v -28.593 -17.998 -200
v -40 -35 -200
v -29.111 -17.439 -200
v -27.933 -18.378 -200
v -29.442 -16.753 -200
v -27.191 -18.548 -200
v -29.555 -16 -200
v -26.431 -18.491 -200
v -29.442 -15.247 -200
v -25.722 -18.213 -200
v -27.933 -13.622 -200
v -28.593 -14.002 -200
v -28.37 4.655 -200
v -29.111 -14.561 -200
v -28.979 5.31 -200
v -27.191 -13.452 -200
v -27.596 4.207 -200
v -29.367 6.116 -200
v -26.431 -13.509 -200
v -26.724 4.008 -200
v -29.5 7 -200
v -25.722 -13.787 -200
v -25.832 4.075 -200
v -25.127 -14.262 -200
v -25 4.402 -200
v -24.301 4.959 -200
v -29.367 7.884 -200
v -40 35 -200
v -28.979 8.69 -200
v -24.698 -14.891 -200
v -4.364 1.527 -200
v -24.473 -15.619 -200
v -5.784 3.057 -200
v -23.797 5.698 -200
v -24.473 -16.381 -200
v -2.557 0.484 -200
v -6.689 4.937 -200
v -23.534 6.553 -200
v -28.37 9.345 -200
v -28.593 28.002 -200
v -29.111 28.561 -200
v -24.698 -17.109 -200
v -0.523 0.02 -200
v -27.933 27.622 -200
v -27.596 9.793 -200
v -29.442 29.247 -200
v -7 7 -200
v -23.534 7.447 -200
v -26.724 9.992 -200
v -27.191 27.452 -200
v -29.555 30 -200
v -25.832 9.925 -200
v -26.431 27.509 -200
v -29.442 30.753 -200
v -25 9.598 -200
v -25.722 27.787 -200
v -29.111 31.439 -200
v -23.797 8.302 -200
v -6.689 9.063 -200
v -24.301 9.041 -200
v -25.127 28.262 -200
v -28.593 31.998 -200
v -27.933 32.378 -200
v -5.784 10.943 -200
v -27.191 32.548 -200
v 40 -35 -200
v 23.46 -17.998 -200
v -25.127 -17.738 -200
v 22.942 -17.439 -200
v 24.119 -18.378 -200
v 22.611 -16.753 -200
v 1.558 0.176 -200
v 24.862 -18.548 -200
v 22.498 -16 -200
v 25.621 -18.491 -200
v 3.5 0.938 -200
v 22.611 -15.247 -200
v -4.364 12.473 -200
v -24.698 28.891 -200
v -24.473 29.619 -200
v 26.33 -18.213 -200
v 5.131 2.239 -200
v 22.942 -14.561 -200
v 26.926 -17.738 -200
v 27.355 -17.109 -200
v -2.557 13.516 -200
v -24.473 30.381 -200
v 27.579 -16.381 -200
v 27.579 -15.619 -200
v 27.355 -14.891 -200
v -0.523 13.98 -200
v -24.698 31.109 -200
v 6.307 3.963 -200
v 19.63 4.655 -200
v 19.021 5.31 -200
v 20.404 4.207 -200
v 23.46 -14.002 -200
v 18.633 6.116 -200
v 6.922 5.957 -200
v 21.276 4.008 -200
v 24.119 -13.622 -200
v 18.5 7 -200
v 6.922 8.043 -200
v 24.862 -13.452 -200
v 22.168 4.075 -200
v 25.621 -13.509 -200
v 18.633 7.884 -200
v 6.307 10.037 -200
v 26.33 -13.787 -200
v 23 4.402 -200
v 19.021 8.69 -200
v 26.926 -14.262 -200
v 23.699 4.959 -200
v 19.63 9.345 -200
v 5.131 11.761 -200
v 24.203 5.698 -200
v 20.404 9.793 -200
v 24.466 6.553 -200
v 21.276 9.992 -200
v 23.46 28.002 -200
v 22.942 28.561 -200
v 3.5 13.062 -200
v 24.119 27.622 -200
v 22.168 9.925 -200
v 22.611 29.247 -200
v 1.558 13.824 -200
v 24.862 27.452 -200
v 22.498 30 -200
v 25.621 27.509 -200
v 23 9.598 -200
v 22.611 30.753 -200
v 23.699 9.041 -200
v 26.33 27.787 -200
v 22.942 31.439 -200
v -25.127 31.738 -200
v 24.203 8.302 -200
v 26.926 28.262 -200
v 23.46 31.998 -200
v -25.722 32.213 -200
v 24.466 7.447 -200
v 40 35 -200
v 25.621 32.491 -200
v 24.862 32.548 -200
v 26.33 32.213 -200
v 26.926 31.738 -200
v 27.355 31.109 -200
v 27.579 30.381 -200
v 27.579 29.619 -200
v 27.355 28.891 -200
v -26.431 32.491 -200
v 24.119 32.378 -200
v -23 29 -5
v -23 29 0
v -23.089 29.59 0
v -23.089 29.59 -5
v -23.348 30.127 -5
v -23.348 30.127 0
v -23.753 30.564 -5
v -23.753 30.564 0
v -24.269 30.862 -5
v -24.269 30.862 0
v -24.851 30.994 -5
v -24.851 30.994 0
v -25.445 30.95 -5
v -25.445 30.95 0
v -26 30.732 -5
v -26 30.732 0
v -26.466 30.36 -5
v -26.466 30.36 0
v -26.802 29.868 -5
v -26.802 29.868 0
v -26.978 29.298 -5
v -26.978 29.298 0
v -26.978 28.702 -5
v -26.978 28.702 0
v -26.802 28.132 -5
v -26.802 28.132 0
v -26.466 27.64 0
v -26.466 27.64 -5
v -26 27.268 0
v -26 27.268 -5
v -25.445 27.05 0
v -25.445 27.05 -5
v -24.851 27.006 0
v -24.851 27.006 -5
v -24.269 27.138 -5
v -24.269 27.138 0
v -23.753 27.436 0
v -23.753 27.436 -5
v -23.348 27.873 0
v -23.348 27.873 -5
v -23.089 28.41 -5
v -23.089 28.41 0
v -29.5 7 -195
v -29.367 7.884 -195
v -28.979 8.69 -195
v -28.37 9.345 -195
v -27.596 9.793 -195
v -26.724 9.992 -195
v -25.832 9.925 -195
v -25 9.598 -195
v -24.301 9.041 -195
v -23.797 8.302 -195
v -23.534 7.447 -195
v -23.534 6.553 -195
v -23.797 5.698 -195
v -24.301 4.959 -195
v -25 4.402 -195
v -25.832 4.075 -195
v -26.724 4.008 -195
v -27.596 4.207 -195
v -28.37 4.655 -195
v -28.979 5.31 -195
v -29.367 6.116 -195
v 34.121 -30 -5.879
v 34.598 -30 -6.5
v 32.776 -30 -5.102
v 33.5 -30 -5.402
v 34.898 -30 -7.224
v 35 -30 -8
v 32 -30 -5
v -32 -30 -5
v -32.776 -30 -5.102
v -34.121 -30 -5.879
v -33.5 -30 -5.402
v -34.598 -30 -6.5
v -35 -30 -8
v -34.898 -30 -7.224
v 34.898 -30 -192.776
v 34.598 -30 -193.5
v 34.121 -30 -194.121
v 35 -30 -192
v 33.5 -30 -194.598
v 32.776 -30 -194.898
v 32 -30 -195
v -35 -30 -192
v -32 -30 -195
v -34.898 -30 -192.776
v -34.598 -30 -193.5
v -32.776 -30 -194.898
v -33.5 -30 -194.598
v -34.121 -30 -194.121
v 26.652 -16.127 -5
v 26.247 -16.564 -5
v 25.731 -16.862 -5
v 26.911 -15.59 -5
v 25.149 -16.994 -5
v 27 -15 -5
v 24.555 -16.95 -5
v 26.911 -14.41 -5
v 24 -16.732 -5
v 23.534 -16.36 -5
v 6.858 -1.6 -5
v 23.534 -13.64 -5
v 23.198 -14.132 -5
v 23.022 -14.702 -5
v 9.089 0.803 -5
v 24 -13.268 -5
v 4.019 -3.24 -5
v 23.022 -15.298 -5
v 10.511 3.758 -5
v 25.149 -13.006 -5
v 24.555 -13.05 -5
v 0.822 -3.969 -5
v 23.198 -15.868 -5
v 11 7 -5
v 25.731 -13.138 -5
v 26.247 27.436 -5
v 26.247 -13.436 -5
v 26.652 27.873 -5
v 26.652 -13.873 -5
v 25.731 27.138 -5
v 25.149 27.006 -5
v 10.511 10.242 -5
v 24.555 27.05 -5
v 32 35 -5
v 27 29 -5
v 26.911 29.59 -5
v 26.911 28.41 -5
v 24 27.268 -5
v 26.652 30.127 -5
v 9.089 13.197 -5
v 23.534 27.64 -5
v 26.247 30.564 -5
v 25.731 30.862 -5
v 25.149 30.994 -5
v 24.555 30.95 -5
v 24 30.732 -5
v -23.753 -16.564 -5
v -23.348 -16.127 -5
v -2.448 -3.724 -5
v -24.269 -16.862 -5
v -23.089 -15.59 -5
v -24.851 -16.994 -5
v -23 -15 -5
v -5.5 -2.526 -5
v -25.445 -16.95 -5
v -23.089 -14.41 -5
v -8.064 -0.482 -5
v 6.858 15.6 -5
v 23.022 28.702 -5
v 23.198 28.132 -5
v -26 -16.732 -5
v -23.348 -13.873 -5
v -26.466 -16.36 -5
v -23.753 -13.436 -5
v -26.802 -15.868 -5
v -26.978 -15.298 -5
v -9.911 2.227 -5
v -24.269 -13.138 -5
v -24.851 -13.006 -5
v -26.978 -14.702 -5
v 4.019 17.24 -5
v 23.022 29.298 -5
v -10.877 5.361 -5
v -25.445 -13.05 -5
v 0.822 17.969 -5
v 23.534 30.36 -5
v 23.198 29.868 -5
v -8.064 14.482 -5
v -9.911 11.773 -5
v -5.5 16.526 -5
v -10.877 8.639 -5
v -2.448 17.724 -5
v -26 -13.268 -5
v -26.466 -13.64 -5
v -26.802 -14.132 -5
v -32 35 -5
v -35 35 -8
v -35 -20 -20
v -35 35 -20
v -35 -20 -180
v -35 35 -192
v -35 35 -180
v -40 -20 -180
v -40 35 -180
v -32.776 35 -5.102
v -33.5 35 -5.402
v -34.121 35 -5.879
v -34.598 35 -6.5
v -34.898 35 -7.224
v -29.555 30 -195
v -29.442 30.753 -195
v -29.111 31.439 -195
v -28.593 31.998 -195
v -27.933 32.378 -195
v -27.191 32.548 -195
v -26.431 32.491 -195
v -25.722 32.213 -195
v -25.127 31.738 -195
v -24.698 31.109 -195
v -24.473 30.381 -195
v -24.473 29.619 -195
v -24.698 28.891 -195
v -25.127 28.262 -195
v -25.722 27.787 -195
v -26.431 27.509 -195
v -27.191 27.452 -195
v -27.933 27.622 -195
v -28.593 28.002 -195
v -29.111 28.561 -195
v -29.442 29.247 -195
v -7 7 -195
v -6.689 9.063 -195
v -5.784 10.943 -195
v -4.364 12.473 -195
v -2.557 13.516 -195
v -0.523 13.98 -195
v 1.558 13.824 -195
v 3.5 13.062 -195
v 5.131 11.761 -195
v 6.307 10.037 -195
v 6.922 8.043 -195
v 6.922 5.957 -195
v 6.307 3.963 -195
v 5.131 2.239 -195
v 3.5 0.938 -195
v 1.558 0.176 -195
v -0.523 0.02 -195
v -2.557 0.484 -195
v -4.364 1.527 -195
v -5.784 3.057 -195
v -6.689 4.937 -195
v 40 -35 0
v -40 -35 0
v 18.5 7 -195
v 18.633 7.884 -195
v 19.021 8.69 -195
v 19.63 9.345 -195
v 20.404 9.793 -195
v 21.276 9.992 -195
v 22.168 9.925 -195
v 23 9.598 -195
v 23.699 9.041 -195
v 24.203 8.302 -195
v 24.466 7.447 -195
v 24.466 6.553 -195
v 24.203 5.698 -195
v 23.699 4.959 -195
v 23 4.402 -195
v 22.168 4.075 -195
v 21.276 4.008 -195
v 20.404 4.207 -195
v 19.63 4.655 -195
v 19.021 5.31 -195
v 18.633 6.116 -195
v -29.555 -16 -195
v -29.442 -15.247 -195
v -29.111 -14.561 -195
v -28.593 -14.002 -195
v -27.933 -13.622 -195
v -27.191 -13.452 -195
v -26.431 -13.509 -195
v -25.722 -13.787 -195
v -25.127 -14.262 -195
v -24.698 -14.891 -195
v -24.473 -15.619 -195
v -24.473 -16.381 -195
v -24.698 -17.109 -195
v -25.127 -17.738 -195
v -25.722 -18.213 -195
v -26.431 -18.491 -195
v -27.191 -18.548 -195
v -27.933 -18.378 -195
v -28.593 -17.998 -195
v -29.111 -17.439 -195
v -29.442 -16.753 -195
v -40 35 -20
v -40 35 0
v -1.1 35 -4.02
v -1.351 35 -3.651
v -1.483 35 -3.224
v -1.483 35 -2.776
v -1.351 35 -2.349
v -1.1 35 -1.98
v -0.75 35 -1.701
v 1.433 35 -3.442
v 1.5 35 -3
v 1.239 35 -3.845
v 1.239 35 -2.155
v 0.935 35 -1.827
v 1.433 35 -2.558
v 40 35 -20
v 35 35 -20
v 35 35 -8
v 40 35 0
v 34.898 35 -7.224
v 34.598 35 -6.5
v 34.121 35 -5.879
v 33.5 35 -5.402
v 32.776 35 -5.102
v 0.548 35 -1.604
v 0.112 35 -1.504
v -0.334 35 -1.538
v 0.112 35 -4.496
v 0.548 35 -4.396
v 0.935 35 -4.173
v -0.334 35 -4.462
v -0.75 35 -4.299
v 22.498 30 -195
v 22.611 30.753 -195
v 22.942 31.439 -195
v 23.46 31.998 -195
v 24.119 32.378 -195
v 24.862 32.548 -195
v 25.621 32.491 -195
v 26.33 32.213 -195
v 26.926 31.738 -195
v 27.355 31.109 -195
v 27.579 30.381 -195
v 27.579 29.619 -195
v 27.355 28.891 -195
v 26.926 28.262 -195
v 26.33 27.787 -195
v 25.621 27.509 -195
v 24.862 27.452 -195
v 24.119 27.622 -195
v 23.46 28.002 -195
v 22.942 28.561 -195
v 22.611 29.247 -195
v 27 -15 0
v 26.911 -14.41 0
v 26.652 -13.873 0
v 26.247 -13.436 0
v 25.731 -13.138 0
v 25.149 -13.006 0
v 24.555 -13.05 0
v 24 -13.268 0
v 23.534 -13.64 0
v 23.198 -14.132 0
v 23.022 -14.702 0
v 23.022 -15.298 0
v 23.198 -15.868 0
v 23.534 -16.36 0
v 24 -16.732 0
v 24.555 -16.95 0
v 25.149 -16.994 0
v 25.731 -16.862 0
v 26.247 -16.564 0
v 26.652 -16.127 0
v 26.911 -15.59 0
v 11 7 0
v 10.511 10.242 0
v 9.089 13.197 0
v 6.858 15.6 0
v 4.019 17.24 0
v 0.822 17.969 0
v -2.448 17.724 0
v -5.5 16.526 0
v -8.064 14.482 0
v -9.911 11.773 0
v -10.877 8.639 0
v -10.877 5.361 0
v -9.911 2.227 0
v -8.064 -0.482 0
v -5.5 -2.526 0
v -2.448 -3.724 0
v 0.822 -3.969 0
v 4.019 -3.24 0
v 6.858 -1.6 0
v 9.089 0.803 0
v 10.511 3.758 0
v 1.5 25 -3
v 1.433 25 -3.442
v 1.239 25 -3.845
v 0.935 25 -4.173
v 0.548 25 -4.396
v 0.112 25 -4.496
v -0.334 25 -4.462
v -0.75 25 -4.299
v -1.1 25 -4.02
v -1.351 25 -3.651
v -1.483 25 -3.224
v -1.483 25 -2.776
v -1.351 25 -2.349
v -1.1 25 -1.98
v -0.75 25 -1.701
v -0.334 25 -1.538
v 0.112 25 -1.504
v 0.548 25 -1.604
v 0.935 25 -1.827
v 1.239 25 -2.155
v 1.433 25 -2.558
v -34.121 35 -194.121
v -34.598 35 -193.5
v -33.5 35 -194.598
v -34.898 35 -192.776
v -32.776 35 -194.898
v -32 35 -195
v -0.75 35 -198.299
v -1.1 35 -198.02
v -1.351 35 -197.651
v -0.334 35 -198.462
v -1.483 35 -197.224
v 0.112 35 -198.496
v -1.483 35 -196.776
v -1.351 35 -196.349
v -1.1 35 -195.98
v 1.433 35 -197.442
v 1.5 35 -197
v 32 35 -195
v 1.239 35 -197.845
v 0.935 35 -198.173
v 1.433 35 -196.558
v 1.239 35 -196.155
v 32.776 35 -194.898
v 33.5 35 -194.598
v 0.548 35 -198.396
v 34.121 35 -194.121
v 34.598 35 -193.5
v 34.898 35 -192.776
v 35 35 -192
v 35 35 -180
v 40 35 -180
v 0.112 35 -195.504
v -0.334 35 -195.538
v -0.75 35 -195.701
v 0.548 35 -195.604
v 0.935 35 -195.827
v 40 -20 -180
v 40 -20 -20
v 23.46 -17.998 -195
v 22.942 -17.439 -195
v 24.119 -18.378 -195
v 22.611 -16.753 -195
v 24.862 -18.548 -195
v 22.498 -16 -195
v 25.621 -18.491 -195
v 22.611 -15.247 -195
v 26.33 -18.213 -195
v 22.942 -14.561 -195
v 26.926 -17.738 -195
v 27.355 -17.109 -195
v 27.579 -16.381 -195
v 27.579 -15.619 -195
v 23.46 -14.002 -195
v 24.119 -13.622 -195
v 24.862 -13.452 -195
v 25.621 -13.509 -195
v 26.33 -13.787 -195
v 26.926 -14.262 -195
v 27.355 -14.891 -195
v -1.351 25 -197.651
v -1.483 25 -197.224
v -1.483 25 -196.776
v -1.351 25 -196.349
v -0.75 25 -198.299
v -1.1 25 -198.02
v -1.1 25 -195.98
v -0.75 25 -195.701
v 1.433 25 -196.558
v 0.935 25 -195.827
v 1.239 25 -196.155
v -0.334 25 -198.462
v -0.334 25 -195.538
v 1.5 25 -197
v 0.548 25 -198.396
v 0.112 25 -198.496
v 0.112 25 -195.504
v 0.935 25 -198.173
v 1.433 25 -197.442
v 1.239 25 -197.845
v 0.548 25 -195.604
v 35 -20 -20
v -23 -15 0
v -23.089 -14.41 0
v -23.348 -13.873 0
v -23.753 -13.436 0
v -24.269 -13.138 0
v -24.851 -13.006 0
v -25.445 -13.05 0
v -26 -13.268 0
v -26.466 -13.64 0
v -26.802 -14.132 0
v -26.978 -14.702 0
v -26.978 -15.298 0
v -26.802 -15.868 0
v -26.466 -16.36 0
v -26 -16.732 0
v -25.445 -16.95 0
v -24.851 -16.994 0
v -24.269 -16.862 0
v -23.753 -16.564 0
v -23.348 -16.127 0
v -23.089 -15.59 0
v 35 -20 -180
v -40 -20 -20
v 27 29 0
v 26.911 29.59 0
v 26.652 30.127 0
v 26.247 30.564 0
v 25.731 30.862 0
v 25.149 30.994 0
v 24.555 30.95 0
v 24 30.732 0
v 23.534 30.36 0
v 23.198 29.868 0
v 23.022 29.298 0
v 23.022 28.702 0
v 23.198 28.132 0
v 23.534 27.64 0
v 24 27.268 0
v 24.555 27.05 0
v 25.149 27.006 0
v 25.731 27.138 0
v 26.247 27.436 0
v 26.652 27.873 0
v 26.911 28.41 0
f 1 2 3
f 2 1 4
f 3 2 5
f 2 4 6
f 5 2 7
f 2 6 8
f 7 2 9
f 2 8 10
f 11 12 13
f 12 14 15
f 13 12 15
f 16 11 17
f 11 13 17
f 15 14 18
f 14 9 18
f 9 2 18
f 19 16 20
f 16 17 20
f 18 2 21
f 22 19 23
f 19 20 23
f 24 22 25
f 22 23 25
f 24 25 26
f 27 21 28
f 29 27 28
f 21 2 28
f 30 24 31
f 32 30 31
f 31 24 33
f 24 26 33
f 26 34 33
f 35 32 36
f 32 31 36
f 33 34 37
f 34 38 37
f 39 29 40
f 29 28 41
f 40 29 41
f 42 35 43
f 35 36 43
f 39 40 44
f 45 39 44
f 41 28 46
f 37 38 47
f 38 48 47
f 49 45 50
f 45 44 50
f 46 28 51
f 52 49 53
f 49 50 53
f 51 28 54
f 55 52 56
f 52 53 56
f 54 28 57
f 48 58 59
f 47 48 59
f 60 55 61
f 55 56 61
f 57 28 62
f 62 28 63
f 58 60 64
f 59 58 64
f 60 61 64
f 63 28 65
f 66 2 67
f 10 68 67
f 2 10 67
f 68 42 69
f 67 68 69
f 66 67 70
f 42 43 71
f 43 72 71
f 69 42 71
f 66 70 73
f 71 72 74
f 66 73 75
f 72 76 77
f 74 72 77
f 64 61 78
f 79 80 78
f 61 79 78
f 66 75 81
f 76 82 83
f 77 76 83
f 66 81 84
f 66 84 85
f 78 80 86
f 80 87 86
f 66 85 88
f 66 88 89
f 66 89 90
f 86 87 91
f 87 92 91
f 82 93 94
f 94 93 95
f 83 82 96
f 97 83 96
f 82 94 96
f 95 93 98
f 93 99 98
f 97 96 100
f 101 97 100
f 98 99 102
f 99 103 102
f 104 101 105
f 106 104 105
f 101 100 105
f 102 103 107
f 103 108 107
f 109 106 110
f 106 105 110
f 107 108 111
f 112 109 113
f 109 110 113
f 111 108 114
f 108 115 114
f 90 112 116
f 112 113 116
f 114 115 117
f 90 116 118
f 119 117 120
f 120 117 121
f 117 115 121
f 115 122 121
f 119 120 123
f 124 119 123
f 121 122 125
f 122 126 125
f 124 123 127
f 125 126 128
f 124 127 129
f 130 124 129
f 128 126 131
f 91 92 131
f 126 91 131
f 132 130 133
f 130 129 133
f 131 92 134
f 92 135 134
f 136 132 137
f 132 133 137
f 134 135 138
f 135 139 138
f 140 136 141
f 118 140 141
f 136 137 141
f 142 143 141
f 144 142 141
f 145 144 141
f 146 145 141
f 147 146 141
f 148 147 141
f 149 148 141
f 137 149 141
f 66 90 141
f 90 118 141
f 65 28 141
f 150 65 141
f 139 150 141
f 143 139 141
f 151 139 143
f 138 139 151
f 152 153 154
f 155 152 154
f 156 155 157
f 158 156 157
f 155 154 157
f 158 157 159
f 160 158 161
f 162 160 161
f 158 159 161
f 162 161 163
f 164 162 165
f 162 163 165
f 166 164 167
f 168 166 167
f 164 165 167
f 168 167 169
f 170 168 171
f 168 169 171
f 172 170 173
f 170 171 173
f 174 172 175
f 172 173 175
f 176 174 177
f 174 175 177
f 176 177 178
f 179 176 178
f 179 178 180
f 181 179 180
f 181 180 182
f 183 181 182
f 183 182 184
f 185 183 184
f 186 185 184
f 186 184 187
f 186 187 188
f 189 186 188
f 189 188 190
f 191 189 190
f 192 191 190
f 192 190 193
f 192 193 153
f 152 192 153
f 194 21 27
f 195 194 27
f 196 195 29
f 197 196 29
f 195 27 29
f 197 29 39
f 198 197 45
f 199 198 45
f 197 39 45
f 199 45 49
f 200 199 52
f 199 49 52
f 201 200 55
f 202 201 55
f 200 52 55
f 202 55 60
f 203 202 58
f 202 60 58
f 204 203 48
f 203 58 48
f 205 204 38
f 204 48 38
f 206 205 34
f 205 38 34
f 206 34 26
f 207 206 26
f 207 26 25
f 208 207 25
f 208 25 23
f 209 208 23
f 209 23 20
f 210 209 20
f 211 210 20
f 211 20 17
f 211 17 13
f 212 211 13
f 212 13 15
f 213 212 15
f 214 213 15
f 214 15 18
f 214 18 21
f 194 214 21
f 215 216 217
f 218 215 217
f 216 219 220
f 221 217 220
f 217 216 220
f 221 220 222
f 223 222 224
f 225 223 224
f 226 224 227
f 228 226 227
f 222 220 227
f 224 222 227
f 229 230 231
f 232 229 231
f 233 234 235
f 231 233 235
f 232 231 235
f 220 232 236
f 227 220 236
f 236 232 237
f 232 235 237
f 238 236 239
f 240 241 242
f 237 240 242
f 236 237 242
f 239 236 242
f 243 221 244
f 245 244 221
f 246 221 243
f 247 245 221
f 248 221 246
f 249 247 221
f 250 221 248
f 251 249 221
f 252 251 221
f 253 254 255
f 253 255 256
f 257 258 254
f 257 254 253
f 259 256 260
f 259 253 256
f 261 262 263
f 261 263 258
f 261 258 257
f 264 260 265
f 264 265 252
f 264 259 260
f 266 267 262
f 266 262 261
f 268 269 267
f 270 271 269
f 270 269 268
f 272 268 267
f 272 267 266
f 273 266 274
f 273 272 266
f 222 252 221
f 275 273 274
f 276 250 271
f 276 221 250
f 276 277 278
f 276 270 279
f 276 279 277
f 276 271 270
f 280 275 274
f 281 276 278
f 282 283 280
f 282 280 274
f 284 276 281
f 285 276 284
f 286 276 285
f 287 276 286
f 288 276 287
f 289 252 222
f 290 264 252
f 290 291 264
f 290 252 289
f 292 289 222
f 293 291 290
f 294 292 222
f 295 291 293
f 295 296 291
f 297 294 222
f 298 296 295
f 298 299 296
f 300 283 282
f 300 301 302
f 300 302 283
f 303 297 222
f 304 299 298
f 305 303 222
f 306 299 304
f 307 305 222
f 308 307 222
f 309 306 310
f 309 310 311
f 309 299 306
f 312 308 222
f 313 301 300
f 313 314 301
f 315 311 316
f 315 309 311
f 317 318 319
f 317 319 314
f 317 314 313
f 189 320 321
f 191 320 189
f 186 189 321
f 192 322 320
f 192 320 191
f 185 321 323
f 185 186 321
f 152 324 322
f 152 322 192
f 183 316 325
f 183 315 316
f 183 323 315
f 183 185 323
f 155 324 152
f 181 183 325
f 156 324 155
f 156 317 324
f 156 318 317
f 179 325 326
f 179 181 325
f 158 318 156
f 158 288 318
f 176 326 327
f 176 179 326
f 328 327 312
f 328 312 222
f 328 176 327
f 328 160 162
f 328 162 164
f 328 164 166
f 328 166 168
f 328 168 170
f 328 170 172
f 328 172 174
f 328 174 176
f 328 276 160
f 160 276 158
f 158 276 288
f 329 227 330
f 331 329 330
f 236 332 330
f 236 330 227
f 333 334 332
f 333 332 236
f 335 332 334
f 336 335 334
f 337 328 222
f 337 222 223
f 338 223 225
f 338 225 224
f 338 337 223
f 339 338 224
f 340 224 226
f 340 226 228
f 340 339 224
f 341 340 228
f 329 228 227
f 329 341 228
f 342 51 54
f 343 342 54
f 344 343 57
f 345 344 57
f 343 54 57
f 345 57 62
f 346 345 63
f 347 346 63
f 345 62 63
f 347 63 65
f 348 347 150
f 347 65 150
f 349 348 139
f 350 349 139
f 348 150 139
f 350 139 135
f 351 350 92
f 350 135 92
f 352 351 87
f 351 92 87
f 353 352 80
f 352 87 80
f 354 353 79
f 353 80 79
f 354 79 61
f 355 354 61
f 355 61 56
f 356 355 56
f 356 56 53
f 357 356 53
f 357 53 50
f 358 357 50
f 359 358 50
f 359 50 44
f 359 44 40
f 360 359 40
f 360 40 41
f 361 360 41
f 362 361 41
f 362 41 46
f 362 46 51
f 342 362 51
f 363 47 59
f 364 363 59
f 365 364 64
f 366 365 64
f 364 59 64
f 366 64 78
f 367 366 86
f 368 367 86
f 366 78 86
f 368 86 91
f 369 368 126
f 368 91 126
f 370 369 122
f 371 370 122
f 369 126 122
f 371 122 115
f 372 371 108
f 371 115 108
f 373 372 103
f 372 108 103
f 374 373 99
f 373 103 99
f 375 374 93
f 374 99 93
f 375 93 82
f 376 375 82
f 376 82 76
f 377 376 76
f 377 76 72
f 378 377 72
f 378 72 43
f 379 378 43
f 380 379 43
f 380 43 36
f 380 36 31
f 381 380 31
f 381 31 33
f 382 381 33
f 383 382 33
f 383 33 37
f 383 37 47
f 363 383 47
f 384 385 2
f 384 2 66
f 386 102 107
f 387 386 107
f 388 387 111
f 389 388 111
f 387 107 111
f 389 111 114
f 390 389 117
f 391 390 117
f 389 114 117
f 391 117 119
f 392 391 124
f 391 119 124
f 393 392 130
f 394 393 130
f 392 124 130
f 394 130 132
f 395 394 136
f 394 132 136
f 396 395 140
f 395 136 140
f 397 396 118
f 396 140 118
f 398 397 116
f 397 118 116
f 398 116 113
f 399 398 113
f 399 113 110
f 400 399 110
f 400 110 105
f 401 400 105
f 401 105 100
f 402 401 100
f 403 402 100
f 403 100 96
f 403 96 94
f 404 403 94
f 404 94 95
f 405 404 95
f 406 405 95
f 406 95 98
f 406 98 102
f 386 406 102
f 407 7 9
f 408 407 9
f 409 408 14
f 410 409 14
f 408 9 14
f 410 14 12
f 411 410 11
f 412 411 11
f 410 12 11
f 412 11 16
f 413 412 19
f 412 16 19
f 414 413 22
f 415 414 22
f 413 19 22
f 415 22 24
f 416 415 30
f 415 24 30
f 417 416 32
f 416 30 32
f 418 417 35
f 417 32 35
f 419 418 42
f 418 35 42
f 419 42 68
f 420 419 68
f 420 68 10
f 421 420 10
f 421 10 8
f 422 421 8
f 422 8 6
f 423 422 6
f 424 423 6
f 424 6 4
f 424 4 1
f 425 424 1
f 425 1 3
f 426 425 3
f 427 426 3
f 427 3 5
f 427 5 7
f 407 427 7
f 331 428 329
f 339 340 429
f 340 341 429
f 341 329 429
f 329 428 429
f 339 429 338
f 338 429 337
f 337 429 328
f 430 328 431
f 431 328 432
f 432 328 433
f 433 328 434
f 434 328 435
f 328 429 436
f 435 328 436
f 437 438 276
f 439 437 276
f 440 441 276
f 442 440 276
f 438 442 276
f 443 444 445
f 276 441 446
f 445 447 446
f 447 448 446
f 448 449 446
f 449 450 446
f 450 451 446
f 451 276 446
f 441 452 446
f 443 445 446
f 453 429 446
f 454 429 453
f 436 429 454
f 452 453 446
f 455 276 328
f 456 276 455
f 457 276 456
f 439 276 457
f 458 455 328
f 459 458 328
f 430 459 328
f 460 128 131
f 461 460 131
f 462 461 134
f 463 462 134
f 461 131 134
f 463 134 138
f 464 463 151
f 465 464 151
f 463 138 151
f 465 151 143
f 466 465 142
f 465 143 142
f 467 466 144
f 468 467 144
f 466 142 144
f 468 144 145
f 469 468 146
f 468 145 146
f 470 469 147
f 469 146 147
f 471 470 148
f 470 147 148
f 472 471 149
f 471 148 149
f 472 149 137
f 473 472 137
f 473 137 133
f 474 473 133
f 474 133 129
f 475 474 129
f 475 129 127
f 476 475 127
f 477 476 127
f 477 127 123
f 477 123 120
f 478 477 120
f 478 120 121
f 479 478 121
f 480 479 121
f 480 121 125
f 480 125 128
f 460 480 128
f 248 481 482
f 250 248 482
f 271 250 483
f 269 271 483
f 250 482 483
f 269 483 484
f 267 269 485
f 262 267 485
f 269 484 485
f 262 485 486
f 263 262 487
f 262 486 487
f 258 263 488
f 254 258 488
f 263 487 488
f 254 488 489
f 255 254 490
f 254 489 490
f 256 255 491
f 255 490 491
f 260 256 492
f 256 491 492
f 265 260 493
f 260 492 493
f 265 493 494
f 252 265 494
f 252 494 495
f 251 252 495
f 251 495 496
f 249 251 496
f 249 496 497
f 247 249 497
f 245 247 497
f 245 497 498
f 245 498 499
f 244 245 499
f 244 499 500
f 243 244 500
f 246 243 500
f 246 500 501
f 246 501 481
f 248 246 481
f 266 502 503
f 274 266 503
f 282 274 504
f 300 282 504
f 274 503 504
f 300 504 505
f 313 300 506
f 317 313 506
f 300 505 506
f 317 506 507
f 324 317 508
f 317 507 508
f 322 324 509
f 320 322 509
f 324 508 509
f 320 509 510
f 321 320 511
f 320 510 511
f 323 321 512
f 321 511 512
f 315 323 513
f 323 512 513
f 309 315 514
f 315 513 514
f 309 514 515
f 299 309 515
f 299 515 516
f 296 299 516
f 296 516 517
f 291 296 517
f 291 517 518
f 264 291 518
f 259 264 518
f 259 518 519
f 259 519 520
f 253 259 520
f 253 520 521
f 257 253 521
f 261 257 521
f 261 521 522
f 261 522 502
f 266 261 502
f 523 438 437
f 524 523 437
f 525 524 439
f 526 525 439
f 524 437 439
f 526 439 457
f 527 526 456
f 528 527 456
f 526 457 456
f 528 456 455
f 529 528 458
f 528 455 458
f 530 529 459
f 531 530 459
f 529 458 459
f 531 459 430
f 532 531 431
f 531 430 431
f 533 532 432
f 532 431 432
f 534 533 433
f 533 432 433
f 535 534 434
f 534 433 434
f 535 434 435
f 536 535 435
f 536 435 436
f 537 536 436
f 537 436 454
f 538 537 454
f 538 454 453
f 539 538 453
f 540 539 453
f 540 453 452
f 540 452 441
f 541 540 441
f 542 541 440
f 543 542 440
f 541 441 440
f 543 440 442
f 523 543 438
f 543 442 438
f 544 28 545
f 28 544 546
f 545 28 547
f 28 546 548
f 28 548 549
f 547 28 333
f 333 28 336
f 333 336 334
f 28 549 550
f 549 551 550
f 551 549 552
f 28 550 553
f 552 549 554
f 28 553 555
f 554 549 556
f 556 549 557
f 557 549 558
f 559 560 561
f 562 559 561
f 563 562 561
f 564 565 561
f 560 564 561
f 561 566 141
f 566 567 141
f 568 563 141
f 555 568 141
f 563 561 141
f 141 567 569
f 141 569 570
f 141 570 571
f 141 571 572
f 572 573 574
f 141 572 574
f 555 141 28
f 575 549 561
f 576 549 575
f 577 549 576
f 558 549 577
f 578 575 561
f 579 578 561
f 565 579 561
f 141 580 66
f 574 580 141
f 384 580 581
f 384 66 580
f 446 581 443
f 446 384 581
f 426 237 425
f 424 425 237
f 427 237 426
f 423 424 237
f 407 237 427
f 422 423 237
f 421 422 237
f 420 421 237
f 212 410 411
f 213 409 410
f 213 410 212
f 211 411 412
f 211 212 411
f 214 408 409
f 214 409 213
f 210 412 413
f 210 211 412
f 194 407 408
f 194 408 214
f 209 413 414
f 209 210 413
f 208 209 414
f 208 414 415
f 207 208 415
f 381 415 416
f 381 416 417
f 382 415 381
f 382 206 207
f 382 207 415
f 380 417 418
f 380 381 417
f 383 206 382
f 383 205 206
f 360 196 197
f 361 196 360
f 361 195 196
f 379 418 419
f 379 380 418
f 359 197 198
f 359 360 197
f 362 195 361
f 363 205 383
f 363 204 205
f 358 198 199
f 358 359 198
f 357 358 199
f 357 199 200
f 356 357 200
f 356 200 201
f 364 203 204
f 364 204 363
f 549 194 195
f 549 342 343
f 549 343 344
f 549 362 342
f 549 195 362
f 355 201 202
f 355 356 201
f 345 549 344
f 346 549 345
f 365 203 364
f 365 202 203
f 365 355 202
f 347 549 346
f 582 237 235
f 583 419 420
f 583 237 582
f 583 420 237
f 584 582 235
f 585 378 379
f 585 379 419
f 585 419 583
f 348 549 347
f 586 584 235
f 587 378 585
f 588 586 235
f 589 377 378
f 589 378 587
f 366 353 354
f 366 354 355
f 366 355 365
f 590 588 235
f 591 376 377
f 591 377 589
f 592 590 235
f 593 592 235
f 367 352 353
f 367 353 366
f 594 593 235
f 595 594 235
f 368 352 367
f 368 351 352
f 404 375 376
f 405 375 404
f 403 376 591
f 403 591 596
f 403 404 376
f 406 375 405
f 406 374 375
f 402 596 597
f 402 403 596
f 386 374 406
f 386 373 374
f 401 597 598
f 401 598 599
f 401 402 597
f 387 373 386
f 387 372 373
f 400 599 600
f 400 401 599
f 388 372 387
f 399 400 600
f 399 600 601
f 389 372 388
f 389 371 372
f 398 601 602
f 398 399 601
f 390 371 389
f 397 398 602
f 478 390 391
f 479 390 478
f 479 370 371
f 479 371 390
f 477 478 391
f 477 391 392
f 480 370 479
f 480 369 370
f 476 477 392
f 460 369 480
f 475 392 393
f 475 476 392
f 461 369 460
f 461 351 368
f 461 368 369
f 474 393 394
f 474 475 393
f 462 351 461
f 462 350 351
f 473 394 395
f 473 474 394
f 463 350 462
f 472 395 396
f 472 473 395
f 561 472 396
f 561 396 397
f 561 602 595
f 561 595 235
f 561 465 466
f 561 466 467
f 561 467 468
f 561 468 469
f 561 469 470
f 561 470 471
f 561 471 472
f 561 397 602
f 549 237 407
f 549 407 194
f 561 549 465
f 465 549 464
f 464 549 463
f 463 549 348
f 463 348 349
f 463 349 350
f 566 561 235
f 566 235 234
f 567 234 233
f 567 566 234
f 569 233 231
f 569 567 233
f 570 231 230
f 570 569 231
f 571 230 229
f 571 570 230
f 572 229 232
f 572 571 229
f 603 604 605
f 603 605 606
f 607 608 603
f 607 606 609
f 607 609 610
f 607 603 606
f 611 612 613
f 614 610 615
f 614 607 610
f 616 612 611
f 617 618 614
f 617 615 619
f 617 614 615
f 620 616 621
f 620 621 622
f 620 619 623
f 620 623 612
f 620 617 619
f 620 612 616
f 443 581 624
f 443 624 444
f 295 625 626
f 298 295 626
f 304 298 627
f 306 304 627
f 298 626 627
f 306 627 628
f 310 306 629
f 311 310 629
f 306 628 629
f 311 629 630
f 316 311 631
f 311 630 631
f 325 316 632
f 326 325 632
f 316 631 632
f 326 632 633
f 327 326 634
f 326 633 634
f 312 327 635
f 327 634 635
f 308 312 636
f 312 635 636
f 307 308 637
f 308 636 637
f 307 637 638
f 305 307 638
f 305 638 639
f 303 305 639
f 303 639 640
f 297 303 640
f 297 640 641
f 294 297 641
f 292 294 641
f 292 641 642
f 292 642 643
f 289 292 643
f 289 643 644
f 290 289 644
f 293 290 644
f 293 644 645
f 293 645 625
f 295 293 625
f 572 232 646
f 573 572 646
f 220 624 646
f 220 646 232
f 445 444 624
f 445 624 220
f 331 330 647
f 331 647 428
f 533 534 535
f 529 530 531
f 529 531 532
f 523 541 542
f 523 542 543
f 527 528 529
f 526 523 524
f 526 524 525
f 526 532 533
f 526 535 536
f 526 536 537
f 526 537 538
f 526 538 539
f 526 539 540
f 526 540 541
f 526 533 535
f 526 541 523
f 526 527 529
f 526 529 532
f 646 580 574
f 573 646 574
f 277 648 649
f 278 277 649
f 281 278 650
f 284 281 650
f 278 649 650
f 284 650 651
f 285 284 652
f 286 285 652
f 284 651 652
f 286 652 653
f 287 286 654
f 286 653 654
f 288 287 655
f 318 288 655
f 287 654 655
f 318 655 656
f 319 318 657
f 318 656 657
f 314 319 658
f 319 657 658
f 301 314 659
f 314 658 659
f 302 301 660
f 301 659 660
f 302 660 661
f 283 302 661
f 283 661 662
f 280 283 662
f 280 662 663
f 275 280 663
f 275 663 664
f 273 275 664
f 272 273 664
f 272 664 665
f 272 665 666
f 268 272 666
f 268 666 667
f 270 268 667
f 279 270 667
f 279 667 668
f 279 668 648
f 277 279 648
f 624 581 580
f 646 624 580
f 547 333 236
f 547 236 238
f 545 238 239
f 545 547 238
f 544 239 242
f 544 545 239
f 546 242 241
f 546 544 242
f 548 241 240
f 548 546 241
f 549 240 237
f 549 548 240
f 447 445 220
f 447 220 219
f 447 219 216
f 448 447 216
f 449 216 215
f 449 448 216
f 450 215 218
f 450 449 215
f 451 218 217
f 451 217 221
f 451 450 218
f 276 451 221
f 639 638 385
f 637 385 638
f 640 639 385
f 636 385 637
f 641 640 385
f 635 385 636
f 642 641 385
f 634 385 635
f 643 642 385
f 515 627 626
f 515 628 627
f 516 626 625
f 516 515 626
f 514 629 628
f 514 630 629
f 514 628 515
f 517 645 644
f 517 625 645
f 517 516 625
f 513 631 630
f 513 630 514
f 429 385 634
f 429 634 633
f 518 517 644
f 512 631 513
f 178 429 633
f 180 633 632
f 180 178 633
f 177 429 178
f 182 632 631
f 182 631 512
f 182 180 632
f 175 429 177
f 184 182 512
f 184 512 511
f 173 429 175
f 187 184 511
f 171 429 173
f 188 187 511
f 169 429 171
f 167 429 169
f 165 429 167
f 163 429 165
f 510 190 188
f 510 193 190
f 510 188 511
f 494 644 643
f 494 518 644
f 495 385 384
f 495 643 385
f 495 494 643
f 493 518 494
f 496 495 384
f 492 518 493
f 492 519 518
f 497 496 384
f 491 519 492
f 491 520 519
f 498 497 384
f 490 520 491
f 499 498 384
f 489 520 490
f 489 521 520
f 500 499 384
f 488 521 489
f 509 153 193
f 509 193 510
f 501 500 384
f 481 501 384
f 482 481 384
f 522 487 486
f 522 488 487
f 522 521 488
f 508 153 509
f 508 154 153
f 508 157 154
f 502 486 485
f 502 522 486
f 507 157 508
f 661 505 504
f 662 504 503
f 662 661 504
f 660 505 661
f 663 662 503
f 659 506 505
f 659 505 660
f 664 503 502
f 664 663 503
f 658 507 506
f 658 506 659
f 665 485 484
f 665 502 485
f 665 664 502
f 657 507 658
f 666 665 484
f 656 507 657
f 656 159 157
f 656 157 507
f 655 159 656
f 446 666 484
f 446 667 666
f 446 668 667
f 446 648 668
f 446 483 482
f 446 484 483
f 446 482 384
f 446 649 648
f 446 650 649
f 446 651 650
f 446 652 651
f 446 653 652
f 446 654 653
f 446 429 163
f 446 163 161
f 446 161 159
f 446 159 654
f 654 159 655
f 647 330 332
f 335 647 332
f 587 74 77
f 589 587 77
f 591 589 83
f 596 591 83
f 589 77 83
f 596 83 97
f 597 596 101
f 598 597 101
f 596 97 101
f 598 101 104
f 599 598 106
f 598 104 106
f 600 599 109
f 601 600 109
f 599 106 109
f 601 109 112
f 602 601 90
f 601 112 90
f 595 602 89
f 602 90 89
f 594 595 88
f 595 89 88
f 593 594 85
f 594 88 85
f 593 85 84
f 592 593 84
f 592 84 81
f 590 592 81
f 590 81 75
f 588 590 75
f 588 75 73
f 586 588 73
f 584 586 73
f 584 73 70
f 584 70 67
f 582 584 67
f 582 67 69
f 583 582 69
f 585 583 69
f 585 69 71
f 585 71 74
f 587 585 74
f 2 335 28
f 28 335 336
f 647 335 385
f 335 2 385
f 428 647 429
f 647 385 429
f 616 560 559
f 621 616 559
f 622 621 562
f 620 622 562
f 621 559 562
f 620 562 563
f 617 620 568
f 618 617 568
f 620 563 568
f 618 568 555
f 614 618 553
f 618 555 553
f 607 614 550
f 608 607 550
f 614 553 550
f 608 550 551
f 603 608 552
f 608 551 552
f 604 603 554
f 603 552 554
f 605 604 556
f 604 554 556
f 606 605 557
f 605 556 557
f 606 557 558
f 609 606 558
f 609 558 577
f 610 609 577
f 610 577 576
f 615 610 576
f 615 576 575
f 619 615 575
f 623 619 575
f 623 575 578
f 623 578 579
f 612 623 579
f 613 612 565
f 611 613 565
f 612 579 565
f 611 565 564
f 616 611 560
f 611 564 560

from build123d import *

# Parameters (mm, degrees)
SKETCH_1_W           = 80
SKETCH_1_H           = 70
EXTRUDE_1_DEPTH      = 200
CUT_EXTRUDE_1_DEPTH  = 65
SKETCH_3_R           = 11
CUT_EXTRUDE_2_DEPTH  = 10
SKETCH_4_R           = 2
SKETCH_4_W           = 27
SKETCH_4_H           = 36
CUT_EXTRUDE_3_DEPTH  = 10
SKETCH_7_R           = 1.5
CUT_EXTRUDE_6_DEPTH  = 10
SKETCH_8_W           = 160
SKETCH_8_H           = 55
CUT_EXTRUDE_7_DEPTH  = 81
SKETCH_10_R          = 7
CUT_EXTRUDE_9_DEPTH  = 10
SKETCH_11_R          = 3
CUT_EXTRUDE_10_DEPTH = 10
SKETCH_12_R          = 2.555087711
CUT_EXTRUDE_11_DEPTH = 10
SKETCH_13_R          = 2
CUT_EXTRUDE_12_DEPTH = 20


with BuildPart() as part:
    # 草图1 → 凸台-拉伸1 (new body)
    with BuildSketch(Plane.XY):
        Rectangle(SKETCH_1_W, SKETCH_1_H)
    extrude(amount=-EXTRUDE_1_DEPTH)

    # 草图2 → 切除-拉伸1 (cut)
    with BuildSketch(Plane(origin=(0, 35, 0), x_dir=(1, 0, 0), z_dir=(0, 1, 0))):
        with BuildLine():
            ThreePointArc((-35, 192), (-34.121320344, 194.121320344), (-32, 195))
            Line((-32, 195), (32, 195))
            ThreePointArc((32, 195), (34.121320344, 194.121320344), (35, 192))
            Line((35, 192), (35, 8))
            ThreePointArc((35, 8), (34.121320344, 5.878679656), (32, 5))
            Line((32, 5), (-32, 5))
            ThreePointArc((-32, 5), (-34.121320344, 5.878679656), (-35, 8))
            Line((-35, 8), (-35, 192))
        make_face()
    extrude(amount=-CUT_EXTRUDE_1_DEPTH, mode=Mode.SUBTRACT)

    # 草图3 → 切除-拉伸2 (cut)
    with BuildSketch(Plane.XY):
        with Locations((0, 7)):
            Circle(SKETCH_3_R)
    extrude(amount=-CUT_EXTRUDE_2_DEPTH, mode=Mode.SUBTRACT)

    # 草图4 → 切除-拉伸3 (cut)
    with BuildSketch(Plane.ZY.offset(40)):
        with Locations((-121.5, 2)):
            Circle(SKETCH_4_R)
        with Locations((-121.5, 26)):
            Circle(SKETCH_4_R)
        with Locations((-158.5, 26)):
            Circle(SKETCH_4_R)
        with Locations((-158.5, 2)):
            Circle(SKETCH_4_R)
        with Locations((-140, 14)):
            Rectangle(SKETCH_4_W, SKETCH_4_H)
    extrude(amount=-CUT_EXTRUDE_3_DEPTH, mode=Mode.SUBTRACT)

    # 草图7 → 切除-拉伸6 (cut)
    with BuildSketch(Plane(origin=(0, 35, 0), x_dir=(1, 0, 0), z_dir=(0, 1, 0))):
        with Locations((-37, 150)):
            Circle(SKETCH_7_R)
        with Locations((-37, 50)):
            Circle(SKETCH_7_R)
        with Locations((37, 50)):
            Circle(SKETCH_7_R)
        with Locations((37, 150)):
            Circle(SKETCH_7_R)
        with Locations((0, 197)):
            Circle(SKETCH_7_R)
        with Locations((0, 3)):
            Circle(SKETCH_7_R)
    extrude(amount=-CUT_EXTRUDE_6_DEPTH, mode=Mode.SUBTRACT)

    # 草图8 → 切除-拉伸7 (cut, through all)
    with BuildSketch(Plane(origin=(40, 0, 0), x_dir=(0, 0, -1), z_dir=(1, 0, 0))):
        with Locations((100, 7.5)):
            Rectangle(SKETCH_8_W, SKETCH_8_H)
    extrude(amount=-CUT_EXTRUDE_7_DEPTH, mode=Mode.SUBTRACT)

    # 草图10 → 切除-拉伸9 (cut)
    with BuildSketch(Plane(origin=(0, 0, -200), x_dir=(-1, 0, 0), z_dir=(0, 0, -1))):
        with Locations((0, 7)):
            Circle(SKETCH_10_R)
    extrude(amount=-CUT_EXTRUDE_9_DEPTH, mode=Mode.SUBTRACT)

    # 草图11 → 切除-拉伸10 (cut)
    with BuildSketch(Plane(origin=(0, 0, -200), x_dir=(-1, 0, 0), z_dir=(0, 0, -1))):
        with Locations((-21.5, 7)):
            Circle(SKETCH_11_R)
        with Locations((26.5, 7)):
            Circle(SKETCH_11_R)
    extrude(amount=-CUT_EXTRUDE_10_DEPTH, mode=Mode.SUBTRACT)

    # 草图12 → 切除-拉伸11 (cut)
    with BuildSketch(Plane(origin=(0, 0, -200), x_dir=(-1, 0, 0), z_dir=(0, 0, -1))):
        with Locations((-25.052626778, -16)):
            Circle(SKETCH_12_R)
        with Locations((-25.052626778, 30)):
            Circle(SKETCH_12_R)
        with Locations((27, 30)):
            Circle(SKETCH_12_R)
        with Locations((27, -16)):
            Circle(SKETCH_12_R)
    extrude(amount=-CUT_EXTRUDE_11_DEPTH, mode=Mode.SUBTRACT)

    # 草图13 → 切除-拉伸12 (cut)
    with BuildSketch(Plane.XY):
        with Locations((25, -15)):
            Circle(SKETCH_13_R)
        with Locations((25, 29)):
            Circle(SKETCH_13_R)
        with Locations((-25, 29)):
            Circle(SKETCH_13_R)
        with Locations((-25, -15)):
            Circle(SKETCH_13_R)
    extrude(amount=-CUT_EXTRUDE_12_DEPTH, mode=Mode.SUBTRACT)


solid = part.part
